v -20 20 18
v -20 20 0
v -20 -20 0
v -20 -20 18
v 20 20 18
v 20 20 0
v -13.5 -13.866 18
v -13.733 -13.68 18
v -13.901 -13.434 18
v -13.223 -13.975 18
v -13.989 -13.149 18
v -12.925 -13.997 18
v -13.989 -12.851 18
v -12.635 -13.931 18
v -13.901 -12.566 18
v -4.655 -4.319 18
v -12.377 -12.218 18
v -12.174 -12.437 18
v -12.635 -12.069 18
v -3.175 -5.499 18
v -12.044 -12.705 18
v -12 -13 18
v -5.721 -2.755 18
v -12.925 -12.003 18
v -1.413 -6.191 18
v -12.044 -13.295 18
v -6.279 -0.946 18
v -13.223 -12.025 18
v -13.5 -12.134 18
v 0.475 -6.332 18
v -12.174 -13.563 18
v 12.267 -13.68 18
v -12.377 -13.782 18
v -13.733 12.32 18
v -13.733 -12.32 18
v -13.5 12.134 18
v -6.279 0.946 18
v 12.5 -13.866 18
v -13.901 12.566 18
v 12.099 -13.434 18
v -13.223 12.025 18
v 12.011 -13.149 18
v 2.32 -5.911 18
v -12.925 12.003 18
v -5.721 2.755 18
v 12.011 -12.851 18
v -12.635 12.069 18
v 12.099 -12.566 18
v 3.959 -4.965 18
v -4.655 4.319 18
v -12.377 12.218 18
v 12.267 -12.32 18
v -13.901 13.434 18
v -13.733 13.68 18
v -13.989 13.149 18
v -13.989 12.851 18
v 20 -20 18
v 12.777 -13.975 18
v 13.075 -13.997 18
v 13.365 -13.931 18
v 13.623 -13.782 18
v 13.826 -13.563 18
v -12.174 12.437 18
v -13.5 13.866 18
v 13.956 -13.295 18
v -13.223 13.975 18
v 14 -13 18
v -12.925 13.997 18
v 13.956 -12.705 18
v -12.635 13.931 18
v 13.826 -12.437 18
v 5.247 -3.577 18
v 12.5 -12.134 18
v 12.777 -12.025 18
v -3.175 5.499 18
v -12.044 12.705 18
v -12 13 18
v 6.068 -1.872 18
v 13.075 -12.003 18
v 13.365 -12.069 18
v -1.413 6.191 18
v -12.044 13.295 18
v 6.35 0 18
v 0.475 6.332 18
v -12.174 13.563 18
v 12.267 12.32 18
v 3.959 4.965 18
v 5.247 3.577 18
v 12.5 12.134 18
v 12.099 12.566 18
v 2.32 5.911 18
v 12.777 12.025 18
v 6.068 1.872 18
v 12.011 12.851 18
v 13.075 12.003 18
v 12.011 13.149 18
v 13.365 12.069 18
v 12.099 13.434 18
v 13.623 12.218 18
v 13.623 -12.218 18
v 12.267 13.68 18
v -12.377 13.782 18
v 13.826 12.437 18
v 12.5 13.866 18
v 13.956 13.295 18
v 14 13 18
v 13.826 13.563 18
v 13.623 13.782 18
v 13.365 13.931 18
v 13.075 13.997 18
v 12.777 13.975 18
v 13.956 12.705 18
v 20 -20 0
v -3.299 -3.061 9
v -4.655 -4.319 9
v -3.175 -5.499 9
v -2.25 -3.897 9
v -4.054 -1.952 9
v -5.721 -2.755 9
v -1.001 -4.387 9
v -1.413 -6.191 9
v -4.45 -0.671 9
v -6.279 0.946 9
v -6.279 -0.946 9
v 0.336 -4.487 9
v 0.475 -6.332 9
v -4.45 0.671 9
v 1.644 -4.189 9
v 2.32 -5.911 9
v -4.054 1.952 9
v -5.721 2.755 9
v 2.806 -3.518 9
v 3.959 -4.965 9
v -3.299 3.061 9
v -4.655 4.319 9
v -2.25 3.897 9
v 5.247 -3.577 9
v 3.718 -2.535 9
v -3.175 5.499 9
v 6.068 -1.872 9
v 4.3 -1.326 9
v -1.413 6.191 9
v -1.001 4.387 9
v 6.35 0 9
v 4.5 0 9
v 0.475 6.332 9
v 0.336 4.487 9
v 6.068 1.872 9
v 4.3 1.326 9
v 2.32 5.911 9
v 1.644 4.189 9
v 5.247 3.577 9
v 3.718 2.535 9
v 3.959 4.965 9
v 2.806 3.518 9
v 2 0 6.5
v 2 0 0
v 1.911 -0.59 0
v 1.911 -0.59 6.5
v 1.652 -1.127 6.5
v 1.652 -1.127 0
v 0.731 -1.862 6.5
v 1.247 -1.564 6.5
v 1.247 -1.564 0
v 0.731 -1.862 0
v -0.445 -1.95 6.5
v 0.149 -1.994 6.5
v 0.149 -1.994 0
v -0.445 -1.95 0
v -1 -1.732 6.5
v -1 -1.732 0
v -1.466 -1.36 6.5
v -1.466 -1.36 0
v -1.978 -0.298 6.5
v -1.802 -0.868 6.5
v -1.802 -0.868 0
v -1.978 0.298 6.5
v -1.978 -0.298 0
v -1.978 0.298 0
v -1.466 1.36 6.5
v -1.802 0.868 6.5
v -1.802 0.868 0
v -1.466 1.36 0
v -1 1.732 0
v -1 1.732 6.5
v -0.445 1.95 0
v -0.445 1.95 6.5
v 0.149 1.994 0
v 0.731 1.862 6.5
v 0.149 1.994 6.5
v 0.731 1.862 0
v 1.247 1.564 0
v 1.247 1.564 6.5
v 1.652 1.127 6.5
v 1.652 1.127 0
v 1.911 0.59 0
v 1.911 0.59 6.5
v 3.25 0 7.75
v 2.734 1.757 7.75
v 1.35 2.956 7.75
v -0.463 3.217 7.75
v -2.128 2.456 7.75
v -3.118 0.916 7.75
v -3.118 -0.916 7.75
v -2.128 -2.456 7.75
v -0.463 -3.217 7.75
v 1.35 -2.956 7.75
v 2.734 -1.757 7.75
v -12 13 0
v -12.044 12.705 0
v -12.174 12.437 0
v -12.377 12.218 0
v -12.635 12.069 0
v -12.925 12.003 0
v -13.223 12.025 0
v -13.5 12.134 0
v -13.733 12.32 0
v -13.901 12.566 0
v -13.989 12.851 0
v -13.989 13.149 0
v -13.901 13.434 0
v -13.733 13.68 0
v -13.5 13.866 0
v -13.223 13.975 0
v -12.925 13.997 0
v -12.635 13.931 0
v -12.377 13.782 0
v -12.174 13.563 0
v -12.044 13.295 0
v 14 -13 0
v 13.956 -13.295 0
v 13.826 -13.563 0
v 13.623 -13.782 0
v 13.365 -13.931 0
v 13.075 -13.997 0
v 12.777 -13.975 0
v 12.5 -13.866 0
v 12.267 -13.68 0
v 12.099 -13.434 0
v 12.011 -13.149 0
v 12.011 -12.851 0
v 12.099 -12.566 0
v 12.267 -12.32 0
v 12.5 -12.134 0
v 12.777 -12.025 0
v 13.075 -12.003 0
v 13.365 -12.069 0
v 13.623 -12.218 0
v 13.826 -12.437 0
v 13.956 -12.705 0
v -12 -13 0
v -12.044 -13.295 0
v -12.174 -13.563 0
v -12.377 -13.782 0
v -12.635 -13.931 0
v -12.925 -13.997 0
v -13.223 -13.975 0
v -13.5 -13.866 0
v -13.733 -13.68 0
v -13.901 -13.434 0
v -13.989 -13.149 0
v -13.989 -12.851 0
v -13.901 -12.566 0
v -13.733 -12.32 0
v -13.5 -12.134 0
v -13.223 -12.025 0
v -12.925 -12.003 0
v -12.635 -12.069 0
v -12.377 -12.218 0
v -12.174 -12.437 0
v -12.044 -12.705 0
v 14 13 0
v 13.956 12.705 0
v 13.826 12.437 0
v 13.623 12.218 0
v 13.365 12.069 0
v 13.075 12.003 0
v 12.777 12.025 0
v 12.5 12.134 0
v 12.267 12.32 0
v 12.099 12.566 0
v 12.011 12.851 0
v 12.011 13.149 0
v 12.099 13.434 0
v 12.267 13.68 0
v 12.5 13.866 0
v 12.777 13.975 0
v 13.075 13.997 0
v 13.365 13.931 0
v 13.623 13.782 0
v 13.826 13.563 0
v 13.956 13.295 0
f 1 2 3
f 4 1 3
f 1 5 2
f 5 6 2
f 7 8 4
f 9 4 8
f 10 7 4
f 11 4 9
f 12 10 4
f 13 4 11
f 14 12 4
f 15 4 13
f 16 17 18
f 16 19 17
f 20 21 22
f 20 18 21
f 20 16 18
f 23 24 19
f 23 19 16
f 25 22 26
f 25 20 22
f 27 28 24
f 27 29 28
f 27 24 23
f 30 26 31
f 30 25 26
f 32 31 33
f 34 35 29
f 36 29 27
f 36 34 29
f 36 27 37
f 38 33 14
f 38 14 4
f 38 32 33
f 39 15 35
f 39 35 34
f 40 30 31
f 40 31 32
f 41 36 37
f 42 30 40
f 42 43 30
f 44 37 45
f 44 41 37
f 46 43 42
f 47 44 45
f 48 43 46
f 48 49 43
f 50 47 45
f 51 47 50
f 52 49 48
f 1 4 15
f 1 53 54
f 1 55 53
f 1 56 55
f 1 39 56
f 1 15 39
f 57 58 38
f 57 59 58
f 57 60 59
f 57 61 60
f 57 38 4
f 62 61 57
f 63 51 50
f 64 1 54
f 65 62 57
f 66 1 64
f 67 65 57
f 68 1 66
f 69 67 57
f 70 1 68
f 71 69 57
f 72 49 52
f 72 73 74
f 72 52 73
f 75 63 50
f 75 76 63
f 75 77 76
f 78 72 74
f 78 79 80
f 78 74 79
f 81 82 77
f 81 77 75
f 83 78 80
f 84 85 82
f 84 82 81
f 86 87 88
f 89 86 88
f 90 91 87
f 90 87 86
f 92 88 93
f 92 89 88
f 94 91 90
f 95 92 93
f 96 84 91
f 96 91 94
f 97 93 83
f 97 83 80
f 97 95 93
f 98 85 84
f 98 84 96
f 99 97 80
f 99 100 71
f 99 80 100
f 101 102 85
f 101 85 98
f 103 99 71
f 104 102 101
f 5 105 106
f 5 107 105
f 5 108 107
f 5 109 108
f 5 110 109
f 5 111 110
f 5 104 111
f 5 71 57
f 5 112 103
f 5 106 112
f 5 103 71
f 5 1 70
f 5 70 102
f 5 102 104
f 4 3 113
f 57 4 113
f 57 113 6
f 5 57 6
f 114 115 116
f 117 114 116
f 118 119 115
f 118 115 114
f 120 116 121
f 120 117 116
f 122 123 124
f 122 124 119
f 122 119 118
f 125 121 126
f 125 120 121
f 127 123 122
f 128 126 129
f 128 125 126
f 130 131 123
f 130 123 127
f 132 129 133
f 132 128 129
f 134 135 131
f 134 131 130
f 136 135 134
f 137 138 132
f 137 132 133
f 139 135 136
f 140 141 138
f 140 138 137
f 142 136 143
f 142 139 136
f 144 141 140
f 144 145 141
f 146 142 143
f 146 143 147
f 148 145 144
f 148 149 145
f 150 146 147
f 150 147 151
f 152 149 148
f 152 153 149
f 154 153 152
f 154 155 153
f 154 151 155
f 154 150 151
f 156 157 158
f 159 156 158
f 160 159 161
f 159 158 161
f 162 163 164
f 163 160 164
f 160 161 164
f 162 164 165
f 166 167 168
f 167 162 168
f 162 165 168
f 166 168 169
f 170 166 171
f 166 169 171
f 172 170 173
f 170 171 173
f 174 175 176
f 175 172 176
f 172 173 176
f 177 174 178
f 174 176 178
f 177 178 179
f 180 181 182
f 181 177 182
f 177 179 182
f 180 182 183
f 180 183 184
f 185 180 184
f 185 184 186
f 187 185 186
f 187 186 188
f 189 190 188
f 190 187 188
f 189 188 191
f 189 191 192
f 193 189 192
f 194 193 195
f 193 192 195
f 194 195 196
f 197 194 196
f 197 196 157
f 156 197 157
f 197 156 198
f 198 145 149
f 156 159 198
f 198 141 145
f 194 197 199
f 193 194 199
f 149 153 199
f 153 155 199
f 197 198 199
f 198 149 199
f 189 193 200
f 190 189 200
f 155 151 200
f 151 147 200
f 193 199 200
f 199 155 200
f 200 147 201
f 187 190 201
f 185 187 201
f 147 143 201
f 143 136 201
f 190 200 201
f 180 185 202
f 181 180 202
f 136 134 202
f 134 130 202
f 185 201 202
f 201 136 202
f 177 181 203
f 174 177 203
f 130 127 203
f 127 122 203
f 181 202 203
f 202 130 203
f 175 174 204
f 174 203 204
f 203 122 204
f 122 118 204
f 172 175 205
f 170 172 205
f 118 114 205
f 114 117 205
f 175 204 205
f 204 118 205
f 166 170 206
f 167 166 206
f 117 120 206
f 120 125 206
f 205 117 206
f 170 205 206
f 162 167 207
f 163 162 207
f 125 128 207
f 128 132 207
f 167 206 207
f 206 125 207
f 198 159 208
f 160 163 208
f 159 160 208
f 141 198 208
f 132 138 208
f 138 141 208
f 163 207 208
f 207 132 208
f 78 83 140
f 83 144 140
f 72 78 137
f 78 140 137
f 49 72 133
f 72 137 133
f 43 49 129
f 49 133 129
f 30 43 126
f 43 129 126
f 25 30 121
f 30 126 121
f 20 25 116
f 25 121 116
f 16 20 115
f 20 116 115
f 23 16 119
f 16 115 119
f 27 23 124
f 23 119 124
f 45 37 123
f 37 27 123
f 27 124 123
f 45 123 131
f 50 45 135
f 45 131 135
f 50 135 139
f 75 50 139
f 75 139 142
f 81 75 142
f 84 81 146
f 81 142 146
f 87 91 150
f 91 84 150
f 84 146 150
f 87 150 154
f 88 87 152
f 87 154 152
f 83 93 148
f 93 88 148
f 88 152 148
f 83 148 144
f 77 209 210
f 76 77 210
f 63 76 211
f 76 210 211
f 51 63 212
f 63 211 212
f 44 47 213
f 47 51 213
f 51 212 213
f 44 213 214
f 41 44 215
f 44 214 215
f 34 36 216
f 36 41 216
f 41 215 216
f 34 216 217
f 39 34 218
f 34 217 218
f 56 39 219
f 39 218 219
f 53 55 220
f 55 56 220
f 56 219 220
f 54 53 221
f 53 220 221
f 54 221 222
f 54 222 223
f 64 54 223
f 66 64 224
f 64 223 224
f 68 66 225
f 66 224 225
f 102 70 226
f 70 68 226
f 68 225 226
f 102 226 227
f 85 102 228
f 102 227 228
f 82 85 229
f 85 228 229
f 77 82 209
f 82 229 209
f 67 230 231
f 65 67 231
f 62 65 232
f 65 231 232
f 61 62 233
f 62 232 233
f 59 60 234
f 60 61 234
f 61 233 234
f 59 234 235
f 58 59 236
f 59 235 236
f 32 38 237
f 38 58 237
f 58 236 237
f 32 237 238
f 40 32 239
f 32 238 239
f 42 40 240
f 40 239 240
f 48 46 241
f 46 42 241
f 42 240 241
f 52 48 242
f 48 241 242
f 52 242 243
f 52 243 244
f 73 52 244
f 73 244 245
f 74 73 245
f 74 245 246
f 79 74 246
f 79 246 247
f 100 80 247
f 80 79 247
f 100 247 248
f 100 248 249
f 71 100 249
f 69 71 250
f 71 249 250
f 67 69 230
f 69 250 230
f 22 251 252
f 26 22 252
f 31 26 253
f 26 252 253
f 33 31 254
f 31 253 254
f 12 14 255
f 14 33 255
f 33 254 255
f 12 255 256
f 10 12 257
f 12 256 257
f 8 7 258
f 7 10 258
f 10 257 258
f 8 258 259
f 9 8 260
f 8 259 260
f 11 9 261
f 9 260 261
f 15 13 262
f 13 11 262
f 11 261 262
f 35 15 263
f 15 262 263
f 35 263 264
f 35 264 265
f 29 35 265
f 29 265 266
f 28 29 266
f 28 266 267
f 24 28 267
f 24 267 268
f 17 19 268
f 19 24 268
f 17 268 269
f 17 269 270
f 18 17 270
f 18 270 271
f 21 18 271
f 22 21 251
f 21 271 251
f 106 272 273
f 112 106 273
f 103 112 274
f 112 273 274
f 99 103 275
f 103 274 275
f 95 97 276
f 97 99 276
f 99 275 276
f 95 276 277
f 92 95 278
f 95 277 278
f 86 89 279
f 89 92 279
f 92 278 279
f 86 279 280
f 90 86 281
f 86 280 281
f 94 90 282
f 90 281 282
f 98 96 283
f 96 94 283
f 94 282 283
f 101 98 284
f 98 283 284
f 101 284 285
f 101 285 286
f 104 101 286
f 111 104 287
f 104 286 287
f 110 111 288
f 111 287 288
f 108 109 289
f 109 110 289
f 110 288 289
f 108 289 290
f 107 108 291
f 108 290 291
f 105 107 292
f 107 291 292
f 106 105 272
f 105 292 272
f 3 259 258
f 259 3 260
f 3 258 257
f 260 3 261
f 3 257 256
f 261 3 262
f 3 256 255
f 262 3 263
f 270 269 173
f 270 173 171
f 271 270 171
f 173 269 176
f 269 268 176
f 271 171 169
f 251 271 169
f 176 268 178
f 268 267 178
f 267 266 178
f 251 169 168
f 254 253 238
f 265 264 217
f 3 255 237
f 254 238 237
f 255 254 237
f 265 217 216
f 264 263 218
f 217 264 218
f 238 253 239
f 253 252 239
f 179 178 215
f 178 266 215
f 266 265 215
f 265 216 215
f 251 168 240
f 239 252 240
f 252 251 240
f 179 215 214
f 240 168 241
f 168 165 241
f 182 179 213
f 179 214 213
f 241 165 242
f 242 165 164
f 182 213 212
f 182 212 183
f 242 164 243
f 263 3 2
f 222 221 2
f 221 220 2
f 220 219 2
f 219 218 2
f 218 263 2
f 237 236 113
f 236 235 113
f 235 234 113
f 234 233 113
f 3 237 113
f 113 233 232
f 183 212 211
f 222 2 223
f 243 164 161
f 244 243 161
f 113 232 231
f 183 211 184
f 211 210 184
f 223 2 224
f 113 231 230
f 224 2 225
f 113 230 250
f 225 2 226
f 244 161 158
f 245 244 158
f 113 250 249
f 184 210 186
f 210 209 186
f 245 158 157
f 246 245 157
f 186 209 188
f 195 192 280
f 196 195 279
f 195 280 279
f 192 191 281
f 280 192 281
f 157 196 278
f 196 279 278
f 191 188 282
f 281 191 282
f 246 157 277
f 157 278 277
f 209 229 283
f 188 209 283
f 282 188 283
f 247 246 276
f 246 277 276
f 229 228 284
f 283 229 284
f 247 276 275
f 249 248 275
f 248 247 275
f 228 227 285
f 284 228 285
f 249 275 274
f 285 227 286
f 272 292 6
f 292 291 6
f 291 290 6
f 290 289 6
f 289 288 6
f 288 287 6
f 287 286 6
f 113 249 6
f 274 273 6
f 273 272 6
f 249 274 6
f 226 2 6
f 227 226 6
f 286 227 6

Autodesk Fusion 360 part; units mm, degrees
sketch "Base" plane through (0, 0, 0) normal (0, 0, 1) x (1, 0, 0)
  line L0 (20, 20) -> (-20, 20)
  line L1 (-20, 20) -> (-20, -20)
  line L2 (-20, -20) -> (20, -20)
  line L3 (20, -20) -> (20, 20)
  line L4 (20, 20) -> (-20, -20) construction
  line L5 (-20, 20) -> (20, -20) construction
  circle A0 centre (0, 0) radius 2
  circle A1 centre (0, 0) radius 6.35
  line L6 (13, 13) -> (-13, 13) construction
  line L7 (-13, 13) -> (-13, -13) construction
  line L8 (-13, -13) -> (13, -13) construction
  line L9 (13, -13) -> (13, 13) construction
  line L10 (13, 13) -> (-13, -13) construction
  line L11 (-13, 13) -> (13, -13) construction
  circle A2 centre (-13, 13) radius 1
  circle A3 centre (13, 13) radius 1
  circle A4 centre (13, -13) radius 1
  circle A5 centre (-13, -13) radius 1
  dimension "d1" = 40
  dimension "d2" = 40
  dimension "d3" = 4
  dimension "d6" = 12.7
  dimension "d10" = 26
  dimension "d11" = 26
  dimension "d12" = 2
  dimension "d13" = 2
  dimension "d14" = 2
  dimension "d15" = 2
extrude "Extrude1" add sketch "Base" along normal blind 18 contours L0 L1 L2 L3
extrude "Extrude2" add sketch "Base" along normal blind 9 contours A1
chamfer "Chamfer1" distance 2.5 angle 45 1 edges at (-1.8647, 0.7232, 9)
equation "d13 = d12"
equation "d14 = d12"
equation "d15 = d12"
